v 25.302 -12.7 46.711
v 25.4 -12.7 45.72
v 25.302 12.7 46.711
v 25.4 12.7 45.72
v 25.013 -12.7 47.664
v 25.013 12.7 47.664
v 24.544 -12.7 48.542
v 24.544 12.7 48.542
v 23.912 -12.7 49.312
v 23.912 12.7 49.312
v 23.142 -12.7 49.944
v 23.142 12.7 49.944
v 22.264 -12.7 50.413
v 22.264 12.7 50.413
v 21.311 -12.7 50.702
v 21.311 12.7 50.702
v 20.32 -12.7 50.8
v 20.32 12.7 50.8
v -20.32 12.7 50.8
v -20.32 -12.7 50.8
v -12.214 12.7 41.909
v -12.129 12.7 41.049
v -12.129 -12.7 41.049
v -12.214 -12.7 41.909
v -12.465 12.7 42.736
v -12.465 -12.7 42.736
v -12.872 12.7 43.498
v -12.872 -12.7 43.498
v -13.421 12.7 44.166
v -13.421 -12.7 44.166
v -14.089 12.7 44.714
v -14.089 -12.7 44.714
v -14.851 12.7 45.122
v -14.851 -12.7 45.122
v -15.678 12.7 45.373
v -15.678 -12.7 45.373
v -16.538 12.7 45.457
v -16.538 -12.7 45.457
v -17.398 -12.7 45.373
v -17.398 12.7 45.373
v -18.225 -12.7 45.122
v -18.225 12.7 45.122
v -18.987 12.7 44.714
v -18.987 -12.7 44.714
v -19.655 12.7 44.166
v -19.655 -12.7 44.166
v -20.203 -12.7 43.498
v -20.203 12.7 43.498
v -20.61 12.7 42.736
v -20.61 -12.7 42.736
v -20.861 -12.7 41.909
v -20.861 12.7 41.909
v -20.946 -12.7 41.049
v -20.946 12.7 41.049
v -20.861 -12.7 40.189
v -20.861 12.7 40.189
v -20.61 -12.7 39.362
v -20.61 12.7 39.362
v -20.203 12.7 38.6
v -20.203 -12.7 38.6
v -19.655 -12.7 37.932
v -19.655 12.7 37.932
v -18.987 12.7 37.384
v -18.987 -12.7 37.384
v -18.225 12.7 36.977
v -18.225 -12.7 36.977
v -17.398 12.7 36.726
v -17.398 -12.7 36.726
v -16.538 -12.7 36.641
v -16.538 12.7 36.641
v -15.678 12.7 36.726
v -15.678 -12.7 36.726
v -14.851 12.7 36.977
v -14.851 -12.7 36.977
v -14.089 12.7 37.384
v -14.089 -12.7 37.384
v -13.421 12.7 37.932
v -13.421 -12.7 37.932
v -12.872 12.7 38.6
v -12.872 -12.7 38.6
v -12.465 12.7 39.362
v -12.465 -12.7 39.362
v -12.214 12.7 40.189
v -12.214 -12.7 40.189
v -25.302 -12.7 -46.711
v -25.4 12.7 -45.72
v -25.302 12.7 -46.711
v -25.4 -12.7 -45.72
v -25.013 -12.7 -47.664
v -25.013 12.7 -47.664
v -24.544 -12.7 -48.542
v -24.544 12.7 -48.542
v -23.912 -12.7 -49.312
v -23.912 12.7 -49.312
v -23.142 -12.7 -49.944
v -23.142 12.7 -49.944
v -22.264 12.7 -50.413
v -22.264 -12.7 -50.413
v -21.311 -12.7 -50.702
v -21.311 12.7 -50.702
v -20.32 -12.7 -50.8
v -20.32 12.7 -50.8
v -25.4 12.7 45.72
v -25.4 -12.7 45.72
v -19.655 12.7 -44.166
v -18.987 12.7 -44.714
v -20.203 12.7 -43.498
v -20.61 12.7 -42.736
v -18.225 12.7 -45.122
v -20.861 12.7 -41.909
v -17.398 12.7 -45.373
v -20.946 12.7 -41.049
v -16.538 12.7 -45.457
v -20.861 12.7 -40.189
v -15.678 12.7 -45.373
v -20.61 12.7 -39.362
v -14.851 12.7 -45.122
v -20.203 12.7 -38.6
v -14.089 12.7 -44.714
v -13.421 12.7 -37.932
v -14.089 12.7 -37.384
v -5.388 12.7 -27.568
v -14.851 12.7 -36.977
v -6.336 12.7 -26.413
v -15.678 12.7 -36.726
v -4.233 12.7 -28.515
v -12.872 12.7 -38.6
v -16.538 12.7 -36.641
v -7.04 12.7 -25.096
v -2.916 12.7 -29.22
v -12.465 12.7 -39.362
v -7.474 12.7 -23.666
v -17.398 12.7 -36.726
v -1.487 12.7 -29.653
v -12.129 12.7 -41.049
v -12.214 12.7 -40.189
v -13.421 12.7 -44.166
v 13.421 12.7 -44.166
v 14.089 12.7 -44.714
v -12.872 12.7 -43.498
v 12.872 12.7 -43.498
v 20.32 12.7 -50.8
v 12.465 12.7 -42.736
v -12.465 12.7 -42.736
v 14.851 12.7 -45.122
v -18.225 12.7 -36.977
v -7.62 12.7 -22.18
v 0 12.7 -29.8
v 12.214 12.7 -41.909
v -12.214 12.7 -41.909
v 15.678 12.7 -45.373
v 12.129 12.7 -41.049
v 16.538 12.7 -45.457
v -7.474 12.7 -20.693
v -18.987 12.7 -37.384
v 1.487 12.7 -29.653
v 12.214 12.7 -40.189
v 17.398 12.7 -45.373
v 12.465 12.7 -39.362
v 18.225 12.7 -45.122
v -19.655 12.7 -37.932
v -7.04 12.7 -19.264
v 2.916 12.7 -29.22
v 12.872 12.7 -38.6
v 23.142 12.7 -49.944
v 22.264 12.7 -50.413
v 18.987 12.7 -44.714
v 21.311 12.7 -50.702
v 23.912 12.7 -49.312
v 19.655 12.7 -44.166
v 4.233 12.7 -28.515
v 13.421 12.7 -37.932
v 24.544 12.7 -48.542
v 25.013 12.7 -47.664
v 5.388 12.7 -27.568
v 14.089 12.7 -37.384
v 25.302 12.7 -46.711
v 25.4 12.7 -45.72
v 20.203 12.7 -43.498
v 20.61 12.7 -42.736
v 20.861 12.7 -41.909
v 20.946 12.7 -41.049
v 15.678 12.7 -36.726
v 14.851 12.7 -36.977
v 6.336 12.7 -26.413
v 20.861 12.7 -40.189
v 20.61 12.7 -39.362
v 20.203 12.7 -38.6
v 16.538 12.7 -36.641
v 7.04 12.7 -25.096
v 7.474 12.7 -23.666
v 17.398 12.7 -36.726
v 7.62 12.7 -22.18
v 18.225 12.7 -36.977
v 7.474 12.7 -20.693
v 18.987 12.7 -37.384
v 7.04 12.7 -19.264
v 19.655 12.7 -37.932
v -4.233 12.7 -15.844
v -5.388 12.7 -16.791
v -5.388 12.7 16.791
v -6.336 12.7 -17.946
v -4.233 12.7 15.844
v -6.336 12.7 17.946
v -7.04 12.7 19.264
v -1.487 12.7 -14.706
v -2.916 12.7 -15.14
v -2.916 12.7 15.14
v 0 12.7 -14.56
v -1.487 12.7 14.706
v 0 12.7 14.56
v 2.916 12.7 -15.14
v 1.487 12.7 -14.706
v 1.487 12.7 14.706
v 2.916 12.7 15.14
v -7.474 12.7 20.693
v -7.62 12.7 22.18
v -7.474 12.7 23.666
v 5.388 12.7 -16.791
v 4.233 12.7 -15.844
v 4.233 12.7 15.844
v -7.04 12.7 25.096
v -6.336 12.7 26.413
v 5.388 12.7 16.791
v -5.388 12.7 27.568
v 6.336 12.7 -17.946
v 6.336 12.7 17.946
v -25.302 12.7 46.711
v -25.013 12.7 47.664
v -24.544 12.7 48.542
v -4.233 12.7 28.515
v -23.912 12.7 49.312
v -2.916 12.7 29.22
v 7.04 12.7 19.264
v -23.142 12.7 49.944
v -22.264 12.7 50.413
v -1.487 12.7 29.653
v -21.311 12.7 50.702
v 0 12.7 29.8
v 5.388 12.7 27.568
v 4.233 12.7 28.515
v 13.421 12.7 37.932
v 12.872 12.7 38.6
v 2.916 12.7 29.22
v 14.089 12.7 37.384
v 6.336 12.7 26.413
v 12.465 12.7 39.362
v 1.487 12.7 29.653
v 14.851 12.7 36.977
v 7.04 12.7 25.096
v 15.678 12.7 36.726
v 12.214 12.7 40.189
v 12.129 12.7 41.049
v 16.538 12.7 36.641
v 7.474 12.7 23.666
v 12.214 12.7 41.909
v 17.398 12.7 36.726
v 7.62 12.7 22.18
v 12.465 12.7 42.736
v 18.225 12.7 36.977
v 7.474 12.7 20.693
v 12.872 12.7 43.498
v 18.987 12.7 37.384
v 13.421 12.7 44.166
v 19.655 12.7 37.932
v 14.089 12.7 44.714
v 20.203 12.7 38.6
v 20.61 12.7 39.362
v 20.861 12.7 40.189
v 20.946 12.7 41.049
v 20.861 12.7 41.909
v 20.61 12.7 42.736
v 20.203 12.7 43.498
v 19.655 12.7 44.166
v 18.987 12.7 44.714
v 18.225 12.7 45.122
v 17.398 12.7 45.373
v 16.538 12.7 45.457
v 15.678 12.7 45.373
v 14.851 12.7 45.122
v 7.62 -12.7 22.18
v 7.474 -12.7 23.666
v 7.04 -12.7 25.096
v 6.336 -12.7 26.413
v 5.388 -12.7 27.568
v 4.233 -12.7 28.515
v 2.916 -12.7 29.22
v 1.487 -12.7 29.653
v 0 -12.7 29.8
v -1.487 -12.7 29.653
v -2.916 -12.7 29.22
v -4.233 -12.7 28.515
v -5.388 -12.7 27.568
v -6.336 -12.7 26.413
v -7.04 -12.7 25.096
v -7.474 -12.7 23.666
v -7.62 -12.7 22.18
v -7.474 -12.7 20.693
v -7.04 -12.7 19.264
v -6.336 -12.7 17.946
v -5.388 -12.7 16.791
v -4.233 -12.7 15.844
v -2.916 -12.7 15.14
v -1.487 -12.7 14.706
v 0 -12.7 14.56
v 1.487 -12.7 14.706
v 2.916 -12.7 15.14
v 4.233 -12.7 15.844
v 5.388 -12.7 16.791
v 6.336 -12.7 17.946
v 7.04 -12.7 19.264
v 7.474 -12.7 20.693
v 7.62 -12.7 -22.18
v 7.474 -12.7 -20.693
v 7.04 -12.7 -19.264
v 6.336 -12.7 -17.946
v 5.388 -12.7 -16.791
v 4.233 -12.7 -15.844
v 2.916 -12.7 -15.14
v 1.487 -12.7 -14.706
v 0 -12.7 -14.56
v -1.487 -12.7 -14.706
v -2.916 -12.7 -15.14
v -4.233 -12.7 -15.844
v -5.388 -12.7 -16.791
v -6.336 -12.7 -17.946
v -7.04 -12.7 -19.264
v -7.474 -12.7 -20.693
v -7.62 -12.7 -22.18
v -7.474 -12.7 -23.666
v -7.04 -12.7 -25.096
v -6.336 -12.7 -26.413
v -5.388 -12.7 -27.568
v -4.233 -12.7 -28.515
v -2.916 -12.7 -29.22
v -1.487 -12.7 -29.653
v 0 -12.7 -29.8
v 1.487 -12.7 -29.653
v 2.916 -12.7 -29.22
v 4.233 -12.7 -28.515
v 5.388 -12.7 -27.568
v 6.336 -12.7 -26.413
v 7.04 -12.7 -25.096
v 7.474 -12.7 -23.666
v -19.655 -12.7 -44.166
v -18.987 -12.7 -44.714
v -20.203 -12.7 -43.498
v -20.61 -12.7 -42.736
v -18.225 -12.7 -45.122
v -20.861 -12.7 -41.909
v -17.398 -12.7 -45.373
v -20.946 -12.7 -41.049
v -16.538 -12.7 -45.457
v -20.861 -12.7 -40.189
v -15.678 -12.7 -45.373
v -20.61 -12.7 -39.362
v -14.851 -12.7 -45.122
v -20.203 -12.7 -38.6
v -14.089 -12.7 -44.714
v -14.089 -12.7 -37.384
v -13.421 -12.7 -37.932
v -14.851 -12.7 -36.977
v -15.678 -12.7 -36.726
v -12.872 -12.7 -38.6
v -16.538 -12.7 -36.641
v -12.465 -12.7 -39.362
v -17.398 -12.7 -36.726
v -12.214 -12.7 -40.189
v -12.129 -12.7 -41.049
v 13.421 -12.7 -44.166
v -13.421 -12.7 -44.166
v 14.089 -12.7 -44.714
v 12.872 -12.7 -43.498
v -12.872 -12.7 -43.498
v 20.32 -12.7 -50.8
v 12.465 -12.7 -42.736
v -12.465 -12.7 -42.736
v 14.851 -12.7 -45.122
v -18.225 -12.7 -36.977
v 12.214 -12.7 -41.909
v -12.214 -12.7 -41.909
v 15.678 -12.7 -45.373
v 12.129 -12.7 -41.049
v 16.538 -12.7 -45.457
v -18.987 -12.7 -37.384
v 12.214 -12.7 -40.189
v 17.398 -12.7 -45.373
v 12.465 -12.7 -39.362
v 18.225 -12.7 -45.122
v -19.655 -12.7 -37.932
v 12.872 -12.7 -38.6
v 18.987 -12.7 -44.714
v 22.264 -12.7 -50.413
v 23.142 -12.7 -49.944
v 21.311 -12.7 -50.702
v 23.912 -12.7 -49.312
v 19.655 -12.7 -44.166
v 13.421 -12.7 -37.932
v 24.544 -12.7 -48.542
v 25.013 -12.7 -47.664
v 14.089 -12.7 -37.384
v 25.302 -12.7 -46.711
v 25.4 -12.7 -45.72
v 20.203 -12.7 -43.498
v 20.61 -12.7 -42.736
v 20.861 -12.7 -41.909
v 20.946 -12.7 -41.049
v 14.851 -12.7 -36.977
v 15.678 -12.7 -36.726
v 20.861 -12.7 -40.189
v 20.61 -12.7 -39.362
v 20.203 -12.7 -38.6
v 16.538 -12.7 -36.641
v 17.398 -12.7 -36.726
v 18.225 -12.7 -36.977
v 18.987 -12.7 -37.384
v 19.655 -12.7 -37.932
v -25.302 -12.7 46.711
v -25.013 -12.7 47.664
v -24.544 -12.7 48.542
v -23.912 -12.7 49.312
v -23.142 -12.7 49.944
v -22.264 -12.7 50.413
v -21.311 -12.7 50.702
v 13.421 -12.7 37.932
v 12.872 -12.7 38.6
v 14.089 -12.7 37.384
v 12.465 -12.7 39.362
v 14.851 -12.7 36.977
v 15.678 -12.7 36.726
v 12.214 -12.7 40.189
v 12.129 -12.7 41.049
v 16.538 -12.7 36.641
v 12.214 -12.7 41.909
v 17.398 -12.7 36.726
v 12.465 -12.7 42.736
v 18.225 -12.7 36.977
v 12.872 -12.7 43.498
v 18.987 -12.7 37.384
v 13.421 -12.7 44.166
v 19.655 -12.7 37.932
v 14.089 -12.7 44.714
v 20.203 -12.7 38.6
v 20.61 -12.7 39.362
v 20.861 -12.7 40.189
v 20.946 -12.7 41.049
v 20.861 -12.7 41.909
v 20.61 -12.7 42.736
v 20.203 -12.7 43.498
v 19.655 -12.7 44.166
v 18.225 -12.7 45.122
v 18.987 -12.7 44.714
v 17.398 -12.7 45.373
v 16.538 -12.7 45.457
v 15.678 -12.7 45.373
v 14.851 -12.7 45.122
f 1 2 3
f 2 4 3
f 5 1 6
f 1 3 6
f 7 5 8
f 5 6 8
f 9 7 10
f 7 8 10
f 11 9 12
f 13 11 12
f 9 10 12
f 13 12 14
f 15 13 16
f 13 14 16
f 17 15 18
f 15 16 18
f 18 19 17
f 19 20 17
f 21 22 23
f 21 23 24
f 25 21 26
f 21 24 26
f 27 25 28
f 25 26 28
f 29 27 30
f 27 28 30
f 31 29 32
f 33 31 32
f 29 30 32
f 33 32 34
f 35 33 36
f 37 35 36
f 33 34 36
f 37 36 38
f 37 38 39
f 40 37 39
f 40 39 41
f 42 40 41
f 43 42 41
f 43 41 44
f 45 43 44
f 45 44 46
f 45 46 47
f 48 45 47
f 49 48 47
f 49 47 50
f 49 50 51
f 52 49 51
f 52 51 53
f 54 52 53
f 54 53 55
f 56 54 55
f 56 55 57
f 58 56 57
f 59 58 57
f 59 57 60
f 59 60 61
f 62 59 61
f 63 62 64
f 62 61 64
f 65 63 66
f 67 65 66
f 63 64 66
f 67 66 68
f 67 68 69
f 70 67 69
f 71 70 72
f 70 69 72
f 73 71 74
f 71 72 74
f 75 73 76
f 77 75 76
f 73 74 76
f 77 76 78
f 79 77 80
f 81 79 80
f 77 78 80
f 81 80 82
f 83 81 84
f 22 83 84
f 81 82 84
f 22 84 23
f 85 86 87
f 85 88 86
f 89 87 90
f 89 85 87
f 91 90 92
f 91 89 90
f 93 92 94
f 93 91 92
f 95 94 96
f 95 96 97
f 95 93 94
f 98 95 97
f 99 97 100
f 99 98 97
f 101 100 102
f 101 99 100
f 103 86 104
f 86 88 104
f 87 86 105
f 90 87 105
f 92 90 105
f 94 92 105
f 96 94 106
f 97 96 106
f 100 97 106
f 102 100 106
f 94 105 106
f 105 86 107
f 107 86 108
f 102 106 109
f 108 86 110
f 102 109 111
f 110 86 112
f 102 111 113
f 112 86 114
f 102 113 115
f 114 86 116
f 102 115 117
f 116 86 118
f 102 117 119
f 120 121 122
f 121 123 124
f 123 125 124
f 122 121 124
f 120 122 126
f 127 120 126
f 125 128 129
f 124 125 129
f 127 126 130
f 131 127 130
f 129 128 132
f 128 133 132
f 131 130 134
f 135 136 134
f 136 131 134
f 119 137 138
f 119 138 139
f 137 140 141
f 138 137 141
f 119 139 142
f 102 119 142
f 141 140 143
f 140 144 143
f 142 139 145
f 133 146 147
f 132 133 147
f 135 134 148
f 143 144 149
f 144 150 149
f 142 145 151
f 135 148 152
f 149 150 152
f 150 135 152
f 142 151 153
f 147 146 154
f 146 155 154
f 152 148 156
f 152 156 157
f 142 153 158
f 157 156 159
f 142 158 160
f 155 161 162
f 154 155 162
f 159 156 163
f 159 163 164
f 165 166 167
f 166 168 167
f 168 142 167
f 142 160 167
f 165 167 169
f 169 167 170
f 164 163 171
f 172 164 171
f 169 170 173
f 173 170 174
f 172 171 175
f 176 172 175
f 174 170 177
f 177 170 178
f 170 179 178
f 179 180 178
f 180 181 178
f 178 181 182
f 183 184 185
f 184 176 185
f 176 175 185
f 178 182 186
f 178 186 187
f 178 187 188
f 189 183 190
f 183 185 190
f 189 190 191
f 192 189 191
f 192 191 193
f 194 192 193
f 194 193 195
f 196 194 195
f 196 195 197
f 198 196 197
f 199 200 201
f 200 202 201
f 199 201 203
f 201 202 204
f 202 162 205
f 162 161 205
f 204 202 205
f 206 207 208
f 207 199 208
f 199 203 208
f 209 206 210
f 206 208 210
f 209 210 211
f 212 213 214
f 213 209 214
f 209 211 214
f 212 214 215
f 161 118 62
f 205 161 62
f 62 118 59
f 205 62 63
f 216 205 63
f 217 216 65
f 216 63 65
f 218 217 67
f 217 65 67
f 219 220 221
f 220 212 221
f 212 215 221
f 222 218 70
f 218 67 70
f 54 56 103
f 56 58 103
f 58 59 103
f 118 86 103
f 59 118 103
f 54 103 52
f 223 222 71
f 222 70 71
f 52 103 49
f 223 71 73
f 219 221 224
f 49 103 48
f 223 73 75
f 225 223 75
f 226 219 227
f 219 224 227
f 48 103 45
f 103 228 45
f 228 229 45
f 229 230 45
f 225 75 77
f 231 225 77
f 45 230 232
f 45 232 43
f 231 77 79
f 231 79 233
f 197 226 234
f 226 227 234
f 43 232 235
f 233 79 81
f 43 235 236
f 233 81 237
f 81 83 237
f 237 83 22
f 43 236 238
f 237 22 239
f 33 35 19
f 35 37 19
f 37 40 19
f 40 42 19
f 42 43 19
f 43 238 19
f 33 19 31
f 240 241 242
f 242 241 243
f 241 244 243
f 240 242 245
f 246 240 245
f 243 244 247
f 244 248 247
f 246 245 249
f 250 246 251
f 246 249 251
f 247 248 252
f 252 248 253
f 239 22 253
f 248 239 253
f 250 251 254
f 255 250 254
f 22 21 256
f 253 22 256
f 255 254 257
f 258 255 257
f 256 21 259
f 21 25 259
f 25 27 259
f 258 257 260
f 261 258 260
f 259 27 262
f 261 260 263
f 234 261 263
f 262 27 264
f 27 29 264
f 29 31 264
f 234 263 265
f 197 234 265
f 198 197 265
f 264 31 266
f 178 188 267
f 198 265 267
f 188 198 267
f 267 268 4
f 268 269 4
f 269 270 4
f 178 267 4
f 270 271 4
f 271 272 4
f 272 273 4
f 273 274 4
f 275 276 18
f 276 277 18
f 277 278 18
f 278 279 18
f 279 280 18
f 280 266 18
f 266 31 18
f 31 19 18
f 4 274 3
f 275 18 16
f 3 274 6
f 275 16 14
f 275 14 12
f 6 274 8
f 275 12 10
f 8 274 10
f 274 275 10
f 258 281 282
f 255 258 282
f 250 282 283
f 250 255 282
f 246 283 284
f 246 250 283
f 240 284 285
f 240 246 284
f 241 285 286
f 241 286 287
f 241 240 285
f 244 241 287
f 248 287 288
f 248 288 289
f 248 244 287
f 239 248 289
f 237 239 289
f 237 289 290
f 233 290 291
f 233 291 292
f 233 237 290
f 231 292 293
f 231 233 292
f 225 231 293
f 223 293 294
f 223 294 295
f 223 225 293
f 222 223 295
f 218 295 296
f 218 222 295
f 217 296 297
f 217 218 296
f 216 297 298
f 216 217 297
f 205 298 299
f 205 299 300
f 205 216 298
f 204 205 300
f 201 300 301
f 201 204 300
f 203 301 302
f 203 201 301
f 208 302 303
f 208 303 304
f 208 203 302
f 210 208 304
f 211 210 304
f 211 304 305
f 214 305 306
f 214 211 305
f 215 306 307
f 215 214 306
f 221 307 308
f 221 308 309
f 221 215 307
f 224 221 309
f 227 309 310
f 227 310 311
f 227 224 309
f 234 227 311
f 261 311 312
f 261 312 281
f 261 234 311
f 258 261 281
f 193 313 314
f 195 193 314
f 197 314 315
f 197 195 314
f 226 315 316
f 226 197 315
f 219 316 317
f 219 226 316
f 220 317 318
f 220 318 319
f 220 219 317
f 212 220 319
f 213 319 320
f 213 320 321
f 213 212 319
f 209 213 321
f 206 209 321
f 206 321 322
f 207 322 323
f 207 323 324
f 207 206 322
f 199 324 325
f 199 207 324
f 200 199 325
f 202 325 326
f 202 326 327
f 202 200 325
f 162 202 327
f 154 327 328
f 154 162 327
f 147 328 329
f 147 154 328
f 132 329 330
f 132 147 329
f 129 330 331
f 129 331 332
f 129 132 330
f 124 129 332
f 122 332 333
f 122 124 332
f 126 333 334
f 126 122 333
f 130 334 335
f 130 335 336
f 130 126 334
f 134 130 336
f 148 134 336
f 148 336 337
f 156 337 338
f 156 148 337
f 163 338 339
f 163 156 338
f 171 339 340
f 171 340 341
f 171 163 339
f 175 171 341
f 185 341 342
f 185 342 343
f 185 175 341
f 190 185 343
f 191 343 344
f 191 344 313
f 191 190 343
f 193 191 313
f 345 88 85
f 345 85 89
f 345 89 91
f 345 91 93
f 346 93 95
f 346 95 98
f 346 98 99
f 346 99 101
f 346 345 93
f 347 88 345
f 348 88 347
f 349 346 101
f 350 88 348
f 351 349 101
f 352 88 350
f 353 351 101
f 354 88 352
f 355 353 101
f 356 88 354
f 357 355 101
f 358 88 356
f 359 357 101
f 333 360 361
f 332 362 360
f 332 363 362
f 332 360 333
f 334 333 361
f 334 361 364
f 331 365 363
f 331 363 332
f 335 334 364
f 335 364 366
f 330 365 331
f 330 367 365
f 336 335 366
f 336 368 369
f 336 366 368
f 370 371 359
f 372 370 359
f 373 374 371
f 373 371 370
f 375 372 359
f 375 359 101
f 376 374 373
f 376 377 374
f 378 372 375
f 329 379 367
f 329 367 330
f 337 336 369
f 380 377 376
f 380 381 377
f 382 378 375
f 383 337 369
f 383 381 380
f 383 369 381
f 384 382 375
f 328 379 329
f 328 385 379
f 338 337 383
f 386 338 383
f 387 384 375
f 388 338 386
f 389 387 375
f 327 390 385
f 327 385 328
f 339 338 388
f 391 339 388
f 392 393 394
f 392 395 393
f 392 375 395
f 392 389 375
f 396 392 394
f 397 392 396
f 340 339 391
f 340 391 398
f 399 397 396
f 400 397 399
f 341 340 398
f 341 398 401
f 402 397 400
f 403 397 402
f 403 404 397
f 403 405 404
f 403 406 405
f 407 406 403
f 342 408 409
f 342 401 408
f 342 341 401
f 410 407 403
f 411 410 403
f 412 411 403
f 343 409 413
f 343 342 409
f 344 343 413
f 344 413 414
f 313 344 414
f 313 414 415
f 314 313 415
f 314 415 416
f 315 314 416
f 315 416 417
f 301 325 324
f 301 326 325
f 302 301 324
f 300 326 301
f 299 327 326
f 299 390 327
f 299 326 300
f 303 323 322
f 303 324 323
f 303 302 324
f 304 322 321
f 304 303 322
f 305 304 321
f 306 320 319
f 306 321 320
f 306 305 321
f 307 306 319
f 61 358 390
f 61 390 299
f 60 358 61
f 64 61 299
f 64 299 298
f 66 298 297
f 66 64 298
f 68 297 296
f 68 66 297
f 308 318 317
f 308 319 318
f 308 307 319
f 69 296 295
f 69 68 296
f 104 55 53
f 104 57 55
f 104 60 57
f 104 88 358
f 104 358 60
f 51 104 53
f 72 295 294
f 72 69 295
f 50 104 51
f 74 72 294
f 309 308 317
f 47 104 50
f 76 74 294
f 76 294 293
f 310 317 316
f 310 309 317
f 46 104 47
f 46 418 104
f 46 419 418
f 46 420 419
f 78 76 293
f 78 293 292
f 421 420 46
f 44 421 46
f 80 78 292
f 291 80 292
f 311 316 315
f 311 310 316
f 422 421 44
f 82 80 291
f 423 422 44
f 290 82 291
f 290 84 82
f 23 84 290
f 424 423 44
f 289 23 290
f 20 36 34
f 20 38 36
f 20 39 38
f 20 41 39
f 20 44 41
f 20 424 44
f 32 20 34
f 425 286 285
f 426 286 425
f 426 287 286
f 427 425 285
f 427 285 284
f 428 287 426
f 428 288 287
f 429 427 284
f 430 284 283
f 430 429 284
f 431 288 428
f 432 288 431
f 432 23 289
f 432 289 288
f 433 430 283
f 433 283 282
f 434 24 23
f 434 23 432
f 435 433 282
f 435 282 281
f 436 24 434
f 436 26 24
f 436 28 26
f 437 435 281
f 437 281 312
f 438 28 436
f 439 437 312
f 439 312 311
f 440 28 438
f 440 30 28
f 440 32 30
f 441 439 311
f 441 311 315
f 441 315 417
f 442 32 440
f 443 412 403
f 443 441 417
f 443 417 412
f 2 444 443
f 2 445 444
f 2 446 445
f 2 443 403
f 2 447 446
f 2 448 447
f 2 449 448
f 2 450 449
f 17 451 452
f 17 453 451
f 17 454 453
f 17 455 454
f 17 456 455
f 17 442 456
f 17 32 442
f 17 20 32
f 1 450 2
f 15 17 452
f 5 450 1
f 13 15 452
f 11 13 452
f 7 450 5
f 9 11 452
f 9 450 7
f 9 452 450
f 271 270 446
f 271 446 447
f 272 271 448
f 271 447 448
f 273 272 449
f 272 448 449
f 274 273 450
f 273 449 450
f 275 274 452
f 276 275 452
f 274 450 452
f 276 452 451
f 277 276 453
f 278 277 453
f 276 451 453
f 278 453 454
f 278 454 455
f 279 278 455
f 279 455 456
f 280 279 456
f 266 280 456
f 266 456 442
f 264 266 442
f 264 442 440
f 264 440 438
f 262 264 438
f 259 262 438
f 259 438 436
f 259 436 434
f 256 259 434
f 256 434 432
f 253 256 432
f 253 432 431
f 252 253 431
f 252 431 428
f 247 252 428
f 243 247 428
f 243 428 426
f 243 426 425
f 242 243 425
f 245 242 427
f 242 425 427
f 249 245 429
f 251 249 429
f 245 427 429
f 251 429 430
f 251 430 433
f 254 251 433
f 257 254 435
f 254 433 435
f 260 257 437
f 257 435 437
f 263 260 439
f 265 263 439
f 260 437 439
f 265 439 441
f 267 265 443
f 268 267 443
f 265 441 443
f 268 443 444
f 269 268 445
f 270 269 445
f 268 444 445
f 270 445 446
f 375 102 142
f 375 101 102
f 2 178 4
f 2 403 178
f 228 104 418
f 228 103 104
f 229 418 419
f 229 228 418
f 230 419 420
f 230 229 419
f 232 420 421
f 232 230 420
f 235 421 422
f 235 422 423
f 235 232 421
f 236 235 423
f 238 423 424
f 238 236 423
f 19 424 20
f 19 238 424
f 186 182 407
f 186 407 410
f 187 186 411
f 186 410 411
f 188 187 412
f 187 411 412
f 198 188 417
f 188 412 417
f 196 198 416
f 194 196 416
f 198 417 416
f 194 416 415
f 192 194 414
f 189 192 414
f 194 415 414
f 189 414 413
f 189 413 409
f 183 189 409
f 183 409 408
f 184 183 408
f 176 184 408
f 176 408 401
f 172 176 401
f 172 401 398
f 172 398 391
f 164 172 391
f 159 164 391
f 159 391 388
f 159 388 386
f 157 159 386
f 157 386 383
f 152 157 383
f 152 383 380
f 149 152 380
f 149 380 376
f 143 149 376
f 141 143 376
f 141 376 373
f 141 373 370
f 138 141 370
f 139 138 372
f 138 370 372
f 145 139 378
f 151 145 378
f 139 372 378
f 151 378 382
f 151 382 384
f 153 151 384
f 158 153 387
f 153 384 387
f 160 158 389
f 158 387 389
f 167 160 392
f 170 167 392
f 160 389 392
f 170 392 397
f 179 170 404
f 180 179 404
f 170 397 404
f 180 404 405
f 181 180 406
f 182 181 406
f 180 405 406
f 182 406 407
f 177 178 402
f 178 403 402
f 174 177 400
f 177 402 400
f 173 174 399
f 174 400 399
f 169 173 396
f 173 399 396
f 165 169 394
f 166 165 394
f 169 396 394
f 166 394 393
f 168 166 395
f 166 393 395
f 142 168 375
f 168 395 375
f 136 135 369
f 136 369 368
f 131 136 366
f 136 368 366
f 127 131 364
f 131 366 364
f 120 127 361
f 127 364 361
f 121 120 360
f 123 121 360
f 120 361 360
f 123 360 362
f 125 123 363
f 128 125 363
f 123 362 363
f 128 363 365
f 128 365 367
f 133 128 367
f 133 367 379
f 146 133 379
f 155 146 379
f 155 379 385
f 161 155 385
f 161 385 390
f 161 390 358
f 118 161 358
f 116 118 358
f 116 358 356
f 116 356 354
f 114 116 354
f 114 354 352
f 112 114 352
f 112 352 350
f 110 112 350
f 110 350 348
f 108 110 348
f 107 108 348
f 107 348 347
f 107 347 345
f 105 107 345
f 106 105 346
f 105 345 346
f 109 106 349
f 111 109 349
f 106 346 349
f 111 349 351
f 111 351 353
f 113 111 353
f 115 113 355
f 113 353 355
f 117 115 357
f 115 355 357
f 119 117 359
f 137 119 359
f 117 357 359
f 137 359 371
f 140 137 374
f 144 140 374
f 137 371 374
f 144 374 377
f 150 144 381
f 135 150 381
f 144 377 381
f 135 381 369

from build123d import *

# Parameters (mm, degrees)
F0_W     = 50.8
F0_H     = 101.6
F0_R     = 7.62
F1_DEPTH = 12.7
F2_R     = 5.08
F3_R     = 4.408168
F4_DEPTH = 25.401


with BuildPart() as f1:
    # F0 (on Front) → F1 (new body, symmetric)
    with BuildSketch(Plane.XZ):
        Rectangle(F0_W, F0_H)
        with Locations((0, -22.179579)):
            Circle(F0_R, mode=Mode.SUBTRACT)
        with Locations((0, 22.179579)):
            Circle(F0_R, mode=Mode.SUBTRACT)
    extrude(amount=F1_DEPTH, both=True)

    # F2
    f2_edges = [f1.edges().sort_by_distance(p)[0] for p in [
        (-25.4, 0, 50.8),
        (25.4, 0, 50.8),
        (25.4, 0, -50.8),
        (-25.4, 0, -50.8),
    ]]
    fillet(f2_edges, radius=F2_R)

    # F3 (on face) → F4 (cut, through all)
    with BuildSketch(Plane.XZ.offset(12.7)):
        with Locations((-16.53761, 41.049208)):
            Circle(F3_R)
        with Locations((16.53761, 41.049208)):
            Circle(F3_R)
        with Locations((16.53761, -41.049208)):
            Circle(F3_R)
        with Locations((-16.53761, -41.049208)):
            Circle(F3_R)
    extrude(amount=-F4_DEPTH, mode=Mode.SUBTRACT)


solid = f1.part
